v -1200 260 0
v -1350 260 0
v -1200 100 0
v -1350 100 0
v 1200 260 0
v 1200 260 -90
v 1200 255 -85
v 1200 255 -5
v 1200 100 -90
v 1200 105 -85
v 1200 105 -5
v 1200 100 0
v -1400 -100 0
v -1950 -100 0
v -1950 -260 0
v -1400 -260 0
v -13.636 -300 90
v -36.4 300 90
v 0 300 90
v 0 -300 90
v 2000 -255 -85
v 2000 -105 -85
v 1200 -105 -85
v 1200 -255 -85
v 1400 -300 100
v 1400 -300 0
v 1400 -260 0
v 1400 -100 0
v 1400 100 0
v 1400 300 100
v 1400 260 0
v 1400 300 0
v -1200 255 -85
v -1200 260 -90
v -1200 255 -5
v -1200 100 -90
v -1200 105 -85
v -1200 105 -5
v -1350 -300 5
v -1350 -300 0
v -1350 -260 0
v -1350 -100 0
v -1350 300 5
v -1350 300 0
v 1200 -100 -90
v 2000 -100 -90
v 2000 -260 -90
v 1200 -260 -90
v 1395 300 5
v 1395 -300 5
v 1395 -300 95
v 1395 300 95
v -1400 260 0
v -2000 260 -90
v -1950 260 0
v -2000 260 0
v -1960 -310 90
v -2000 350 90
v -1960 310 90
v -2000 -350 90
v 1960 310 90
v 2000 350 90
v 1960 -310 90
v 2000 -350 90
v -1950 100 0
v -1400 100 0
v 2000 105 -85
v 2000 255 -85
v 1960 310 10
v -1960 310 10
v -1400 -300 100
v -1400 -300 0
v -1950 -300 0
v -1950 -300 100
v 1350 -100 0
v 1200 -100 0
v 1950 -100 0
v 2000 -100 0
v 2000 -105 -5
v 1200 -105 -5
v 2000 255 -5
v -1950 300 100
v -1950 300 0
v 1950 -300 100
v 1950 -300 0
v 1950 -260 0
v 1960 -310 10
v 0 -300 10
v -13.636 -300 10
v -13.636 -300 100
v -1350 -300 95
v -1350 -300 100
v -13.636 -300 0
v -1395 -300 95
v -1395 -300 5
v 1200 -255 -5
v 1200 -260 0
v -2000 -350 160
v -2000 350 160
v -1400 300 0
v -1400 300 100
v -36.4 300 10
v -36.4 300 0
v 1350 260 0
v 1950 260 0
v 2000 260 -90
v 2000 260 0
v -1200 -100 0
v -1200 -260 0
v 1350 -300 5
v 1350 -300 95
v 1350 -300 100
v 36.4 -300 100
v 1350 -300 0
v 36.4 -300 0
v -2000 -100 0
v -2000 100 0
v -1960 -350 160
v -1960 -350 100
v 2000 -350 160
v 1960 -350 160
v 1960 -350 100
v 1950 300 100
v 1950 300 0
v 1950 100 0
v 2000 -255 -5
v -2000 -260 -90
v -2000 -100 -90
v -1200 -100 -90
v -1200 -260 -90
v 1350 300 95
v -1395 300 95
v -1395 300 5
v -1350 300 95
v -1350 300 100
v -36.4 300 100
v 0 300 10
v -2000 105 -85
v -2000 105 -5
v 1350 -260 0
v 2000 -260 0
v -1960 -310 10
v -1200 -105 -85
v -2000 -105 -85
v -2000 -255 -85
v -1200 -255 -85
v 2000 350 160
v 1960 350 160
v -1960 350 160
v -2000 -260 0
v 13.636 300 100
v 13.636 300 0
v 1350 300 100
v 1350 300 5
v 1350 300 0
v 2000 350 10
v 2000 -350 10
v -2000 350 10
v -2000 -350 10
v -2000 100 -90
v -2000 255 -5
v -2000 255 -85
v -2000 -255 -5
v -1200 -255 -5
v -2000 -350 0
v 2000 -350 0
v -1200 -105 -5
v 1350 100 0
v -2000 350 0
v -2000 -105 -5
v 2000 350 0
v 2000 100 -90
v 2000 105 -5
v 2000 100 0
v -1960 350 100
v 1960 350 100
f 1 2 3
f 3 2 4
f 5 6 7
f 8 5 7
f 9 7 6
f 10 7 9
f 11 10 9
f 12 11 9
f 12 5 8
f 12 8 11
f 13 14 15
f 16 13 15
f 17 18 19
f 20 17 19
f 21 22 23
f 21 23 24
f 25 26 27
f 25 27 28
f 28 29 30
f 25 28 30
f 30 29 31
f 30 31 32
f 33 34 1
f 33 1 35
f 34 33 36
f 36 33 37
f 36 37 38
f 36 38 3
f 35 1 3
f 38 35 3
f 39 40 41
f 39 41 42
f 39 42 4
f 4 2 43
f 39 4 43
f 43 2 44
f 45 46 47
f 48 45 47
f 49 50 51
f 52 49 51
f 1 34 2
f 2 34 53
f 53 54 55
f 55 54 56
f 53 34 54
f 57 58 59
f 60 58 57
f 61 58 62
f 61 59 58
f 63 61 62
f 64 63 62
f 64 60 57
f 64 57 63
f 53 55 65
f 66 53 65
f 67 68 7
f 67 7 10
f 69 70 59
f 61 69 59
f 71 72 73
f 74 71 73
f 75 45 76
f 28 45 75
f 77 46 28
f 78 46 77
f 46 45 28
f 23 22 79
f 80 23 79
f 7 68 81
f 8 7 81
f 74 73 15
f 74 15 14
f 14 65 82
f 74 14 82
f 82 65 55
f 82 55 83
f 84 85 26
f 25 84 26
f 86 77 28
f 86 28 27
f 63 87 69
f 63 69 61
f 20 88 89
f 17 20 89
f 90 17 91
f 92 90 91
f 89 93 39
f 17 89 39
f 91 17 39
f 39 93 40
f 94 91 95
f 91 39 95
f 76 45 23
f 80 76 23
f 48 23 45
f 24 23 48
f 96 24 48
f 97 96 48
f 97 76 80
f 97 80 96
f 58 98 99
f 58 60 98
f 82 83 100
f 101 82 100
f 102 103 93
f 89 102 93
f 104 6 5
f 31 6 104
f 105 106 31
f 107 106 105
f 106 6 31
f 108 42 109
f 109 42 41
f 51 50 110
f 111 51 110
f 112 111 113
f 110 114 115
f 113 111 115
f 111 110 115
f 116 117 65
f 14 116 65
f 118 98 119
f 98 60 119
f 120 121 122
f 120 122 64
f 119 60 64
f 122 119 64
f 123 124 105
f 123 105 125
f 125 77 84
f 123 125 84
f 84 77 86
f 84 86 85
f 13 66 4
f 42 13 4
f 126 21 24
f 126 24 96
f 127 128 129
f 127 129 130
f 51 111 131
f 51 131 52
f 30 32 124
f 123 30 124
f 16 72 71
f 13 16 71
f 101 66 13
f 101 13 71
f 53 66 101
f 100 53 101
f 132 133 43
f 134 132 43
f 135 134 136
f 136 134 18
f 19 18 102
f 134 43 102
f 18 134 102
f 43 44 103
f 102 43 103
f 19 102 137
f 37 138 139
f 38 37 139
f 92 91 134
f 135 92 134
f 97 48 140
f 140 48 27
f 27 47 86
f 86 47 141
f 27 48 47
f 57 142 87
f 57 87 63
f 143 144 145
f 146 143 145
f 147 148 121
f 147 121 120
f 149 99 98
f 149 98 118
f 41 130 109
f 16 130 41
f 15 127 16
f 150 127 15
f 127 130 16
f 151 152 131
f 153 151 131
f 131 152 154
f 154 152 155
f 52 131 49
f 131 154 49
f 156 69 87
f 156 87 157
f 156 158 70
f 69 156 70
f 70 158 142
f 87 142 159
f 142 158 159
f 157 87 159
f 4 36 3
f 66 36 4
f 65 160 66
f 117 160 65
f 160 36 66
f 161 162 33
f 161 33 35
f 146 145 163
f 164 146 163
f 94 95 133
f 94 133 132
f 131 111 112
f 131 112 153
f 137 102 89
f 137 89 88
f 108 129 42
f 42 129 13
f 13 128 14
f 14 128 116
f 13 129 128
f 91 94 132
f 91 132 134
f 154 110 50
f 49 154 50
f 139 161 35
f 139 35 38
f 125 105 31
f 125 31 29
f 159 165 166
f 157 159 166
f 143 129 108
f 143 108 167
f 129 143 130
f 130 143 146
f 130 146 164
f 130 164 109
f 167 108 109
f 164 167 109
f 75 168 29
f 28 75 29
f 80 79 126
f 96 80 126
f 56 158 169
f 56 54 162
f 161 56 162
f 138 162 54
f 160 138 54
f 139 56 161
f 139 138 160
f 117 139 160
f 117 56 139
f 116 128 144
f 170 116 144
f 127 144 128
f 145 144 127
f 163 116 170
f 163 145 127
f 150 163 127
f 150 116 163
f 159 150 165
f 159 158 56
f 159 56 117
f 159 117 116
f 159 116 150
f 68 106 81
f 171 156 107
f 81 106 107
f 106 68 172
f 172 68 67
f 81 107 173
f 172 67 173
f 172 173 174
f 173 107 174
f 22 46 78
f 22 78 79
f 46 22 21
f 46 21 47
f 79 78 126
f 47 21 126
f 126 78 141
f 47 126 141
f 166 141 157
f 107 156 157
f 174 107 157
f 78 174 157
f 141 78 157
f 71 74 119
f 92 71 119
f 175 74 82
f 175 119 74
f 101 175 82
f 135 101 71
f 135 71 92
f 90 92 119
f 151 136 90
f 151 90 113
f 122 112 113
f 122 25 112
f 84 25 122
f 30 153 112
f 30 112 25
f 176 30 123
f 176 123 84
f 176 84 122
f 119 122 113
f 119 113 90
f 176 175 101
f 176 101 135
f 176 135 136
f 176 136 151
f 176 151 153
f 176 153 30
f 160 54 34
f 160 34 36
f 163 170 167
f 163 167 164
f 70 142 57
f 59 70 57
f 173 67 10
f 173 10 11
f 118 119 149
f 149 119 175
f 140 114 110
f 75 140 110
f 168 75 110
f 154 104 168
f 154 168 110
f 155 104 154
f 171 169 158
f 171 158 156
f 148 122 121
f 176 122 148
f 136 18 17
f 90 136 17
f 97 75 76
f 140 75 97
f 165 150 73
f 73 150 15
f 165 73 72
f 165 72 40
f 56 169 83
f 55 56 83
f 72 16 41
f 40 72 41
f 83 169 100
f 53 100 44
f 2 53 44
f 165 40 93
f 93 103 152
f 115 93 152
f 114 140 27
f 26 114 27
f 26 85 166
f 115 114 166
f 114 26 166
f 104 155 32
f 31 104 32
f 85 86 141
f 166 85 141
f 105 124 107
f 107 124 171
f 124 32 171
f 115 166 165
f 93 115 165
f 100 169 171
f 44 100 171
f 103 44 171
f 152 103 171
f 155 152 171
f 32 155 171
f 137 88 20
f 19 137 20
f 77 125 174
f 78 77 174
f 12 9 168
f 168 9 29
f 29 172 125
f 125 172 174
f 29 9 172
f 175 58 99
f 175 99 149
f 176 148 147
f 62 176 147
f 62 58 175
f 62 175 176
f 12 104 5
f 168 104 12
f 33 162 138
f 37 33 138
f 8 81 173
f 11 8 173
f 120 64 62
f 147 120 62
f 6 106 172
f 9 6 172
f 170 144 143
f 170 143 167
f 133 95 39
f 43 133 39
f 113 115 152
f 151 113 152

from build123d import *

# Parameters (mm, degrees)
F0_W          = 4000
F0_H          = 700
F0_W_2        = 50
F0_H_2        = 600
F1_DEPTH      = 100
F2_W          = 40
F2_H          = 80
F3_DEPTH      = 4000.001
F4_W          = 40
F4_H          = 80
F5_DEPTH      = 660.001
F6_W          = 90
F6_H          = 80
F6_H_2        = 90
F7_DEPTH      = 300
F7_DEPTH_BACK = 300
F8_W          = 40
F8_H          = 700
F9_DEPTH      = 60
F10_W         = 35
F10_H         = 55
F11_DEPTH     = 700.001
F12_W         = 160
F12_H         = 90
F12_W_2       = 150
F12_H_2       = 80
F13_DEPTH     = 800


with BuildPart() as f1:
    # F0 (on Top) → F1 (new body)
    with BuildSketch(Plane.XY):
        Rectangle(F0_W, F0_H)
        Polygon((-1950, -300), (-1950, 300), (-1400, 300), (-1350, 300), (-36.3996071229, 300), (-13.6363636364, -300), (-1350, -300), (-1400, -300), align=None, mode=Mode.SUBTRACT)
        Polygon((1400, 300), (1950, 300), (1950, -300), (1400, -300), (1350, -300), (36.3996071229, -300), (13.6363636364, 300), (1350, 300), align=None, mode=Mode.SUBTRACT)
        with Locations((-1375, 0)):
            Rectangle(F0_W_2, F0_H_2)
        with Locations((1375, 0)):
            Rectangle(F0_W_2, F0_H_2)
    extrude(amount=F1_DEPTH)

    # F2 (on face) → F3 (cut, through all)
    with BuildSketch(Plane(origin=(-2000, 0, 0), x_dir=(0, -1, 0), z_dir=(-1, 0, 0))):
        with Locations((-330, 50)):
            Rectangle(F2_W, F2_H)
        with Locations((330, 50)):
            Rectangle(F2_W, F2_H)
    extrude(amount=-F3_DEPTH, mode=Mode.SUBTRACT)

    # F4 (on face) → F5 (cut, through all)
    with BuildSketch(Plane.XZ.offset(310)):
        with Locations((1980, 50)):
            Rectangle(F4_W, F4_H)
        with Locations((-1980, 50)):
            Rectangle(F4_W, F4_H)
    extrude(amount=-F5_DEPTH, mode=Mode.SUBTRACT)

    # F6 (on Front) → F7 (cut, two sides)
    with BuildSketch(Plane.XZ) as f7_sk:
        with Locations((-45, 50)):
            Rectangle(F6_W, F6_H)
        with Locations((-1350, 50)):
            Rectangle(F6_W, F6_H_2)
        with Locations((1350, 50)):
            Rectangle(F6_W, F6_H_2)
    extrude(amount=-F7_DEPTH, mode=Mode.SUBTRACT)
    extrude(f7_sk.sketch, amount=F7_DEPTH_BACK, mode=Mode.SUBTRACT)

    # F8 (on face) → F9 (join)
    with BuildSketch(Plane.XY.offset(100)):
        with Locations((-1980, 0)):
            Rectangle(F8_W, F8_H)
        with Locations((1980, 0)):
            Rectangle(F8_W, F8_H)
    extrude(amount=F9_DEPTH)

    # F10 (on face) → F11 (cut, through all)
    with BuildSketch(Plane.XZ.offset(350)):
        with Locations((1280.4266214371, 130)):
            Rectangle(F10_W, F10_H)
        with Locations((-1280.4266214371, 130)):
            Rectangle(F10_W, F10_H)
    extrude(amount=-F11_DEPTH, mode=Mode.SUBTRACT)



with BuildPart() as f13:
    # F12 (on face) → F13 (new body)
    with BuildSketch(Plane(origin=(-2000, 0, 0), x_dir=(0, -1, 0), z_dir=(-1, 0, 0))):
        with Locations((-180, -45)):
            Rectangle(F12_W, F12_H)
        with Locations((-180, -45)):
            Rectangle(F12_W_2, F12_H_2, mode=Mode.SUBTRACT)
    extrude(amount=-F13_DEPTH)


with BuildPart() as f13b:
    # F12 (on face) → F13, piece 2 (new body)
    with BuildSketch(Plane(origin=(-2000, 0, 0), x_dir=(0, -1, 0), z_dir=(-1, 0, 0))):
        with Locations((180, -45)):
            Rectangle(F12_W, F12_H)
        with Locations((180, -45)):
            Rectangle(F12_W_2, F12_H_2, mode=Mode.SUBTRACT)
    extrude(amount=-F13_DEPTH)


with BuildPart() as f1_1:
    add(f1.part)

    add(f13.part)  # F14 merges F13

    add(f13b.part)  # F14 merges F13b
    # F14: F13b, F13 across plane
    add(f13b.part.mirror(Plane.YZ))
    add(f13.part.mirror(Plane.YZ))


solid = f1_1.part
